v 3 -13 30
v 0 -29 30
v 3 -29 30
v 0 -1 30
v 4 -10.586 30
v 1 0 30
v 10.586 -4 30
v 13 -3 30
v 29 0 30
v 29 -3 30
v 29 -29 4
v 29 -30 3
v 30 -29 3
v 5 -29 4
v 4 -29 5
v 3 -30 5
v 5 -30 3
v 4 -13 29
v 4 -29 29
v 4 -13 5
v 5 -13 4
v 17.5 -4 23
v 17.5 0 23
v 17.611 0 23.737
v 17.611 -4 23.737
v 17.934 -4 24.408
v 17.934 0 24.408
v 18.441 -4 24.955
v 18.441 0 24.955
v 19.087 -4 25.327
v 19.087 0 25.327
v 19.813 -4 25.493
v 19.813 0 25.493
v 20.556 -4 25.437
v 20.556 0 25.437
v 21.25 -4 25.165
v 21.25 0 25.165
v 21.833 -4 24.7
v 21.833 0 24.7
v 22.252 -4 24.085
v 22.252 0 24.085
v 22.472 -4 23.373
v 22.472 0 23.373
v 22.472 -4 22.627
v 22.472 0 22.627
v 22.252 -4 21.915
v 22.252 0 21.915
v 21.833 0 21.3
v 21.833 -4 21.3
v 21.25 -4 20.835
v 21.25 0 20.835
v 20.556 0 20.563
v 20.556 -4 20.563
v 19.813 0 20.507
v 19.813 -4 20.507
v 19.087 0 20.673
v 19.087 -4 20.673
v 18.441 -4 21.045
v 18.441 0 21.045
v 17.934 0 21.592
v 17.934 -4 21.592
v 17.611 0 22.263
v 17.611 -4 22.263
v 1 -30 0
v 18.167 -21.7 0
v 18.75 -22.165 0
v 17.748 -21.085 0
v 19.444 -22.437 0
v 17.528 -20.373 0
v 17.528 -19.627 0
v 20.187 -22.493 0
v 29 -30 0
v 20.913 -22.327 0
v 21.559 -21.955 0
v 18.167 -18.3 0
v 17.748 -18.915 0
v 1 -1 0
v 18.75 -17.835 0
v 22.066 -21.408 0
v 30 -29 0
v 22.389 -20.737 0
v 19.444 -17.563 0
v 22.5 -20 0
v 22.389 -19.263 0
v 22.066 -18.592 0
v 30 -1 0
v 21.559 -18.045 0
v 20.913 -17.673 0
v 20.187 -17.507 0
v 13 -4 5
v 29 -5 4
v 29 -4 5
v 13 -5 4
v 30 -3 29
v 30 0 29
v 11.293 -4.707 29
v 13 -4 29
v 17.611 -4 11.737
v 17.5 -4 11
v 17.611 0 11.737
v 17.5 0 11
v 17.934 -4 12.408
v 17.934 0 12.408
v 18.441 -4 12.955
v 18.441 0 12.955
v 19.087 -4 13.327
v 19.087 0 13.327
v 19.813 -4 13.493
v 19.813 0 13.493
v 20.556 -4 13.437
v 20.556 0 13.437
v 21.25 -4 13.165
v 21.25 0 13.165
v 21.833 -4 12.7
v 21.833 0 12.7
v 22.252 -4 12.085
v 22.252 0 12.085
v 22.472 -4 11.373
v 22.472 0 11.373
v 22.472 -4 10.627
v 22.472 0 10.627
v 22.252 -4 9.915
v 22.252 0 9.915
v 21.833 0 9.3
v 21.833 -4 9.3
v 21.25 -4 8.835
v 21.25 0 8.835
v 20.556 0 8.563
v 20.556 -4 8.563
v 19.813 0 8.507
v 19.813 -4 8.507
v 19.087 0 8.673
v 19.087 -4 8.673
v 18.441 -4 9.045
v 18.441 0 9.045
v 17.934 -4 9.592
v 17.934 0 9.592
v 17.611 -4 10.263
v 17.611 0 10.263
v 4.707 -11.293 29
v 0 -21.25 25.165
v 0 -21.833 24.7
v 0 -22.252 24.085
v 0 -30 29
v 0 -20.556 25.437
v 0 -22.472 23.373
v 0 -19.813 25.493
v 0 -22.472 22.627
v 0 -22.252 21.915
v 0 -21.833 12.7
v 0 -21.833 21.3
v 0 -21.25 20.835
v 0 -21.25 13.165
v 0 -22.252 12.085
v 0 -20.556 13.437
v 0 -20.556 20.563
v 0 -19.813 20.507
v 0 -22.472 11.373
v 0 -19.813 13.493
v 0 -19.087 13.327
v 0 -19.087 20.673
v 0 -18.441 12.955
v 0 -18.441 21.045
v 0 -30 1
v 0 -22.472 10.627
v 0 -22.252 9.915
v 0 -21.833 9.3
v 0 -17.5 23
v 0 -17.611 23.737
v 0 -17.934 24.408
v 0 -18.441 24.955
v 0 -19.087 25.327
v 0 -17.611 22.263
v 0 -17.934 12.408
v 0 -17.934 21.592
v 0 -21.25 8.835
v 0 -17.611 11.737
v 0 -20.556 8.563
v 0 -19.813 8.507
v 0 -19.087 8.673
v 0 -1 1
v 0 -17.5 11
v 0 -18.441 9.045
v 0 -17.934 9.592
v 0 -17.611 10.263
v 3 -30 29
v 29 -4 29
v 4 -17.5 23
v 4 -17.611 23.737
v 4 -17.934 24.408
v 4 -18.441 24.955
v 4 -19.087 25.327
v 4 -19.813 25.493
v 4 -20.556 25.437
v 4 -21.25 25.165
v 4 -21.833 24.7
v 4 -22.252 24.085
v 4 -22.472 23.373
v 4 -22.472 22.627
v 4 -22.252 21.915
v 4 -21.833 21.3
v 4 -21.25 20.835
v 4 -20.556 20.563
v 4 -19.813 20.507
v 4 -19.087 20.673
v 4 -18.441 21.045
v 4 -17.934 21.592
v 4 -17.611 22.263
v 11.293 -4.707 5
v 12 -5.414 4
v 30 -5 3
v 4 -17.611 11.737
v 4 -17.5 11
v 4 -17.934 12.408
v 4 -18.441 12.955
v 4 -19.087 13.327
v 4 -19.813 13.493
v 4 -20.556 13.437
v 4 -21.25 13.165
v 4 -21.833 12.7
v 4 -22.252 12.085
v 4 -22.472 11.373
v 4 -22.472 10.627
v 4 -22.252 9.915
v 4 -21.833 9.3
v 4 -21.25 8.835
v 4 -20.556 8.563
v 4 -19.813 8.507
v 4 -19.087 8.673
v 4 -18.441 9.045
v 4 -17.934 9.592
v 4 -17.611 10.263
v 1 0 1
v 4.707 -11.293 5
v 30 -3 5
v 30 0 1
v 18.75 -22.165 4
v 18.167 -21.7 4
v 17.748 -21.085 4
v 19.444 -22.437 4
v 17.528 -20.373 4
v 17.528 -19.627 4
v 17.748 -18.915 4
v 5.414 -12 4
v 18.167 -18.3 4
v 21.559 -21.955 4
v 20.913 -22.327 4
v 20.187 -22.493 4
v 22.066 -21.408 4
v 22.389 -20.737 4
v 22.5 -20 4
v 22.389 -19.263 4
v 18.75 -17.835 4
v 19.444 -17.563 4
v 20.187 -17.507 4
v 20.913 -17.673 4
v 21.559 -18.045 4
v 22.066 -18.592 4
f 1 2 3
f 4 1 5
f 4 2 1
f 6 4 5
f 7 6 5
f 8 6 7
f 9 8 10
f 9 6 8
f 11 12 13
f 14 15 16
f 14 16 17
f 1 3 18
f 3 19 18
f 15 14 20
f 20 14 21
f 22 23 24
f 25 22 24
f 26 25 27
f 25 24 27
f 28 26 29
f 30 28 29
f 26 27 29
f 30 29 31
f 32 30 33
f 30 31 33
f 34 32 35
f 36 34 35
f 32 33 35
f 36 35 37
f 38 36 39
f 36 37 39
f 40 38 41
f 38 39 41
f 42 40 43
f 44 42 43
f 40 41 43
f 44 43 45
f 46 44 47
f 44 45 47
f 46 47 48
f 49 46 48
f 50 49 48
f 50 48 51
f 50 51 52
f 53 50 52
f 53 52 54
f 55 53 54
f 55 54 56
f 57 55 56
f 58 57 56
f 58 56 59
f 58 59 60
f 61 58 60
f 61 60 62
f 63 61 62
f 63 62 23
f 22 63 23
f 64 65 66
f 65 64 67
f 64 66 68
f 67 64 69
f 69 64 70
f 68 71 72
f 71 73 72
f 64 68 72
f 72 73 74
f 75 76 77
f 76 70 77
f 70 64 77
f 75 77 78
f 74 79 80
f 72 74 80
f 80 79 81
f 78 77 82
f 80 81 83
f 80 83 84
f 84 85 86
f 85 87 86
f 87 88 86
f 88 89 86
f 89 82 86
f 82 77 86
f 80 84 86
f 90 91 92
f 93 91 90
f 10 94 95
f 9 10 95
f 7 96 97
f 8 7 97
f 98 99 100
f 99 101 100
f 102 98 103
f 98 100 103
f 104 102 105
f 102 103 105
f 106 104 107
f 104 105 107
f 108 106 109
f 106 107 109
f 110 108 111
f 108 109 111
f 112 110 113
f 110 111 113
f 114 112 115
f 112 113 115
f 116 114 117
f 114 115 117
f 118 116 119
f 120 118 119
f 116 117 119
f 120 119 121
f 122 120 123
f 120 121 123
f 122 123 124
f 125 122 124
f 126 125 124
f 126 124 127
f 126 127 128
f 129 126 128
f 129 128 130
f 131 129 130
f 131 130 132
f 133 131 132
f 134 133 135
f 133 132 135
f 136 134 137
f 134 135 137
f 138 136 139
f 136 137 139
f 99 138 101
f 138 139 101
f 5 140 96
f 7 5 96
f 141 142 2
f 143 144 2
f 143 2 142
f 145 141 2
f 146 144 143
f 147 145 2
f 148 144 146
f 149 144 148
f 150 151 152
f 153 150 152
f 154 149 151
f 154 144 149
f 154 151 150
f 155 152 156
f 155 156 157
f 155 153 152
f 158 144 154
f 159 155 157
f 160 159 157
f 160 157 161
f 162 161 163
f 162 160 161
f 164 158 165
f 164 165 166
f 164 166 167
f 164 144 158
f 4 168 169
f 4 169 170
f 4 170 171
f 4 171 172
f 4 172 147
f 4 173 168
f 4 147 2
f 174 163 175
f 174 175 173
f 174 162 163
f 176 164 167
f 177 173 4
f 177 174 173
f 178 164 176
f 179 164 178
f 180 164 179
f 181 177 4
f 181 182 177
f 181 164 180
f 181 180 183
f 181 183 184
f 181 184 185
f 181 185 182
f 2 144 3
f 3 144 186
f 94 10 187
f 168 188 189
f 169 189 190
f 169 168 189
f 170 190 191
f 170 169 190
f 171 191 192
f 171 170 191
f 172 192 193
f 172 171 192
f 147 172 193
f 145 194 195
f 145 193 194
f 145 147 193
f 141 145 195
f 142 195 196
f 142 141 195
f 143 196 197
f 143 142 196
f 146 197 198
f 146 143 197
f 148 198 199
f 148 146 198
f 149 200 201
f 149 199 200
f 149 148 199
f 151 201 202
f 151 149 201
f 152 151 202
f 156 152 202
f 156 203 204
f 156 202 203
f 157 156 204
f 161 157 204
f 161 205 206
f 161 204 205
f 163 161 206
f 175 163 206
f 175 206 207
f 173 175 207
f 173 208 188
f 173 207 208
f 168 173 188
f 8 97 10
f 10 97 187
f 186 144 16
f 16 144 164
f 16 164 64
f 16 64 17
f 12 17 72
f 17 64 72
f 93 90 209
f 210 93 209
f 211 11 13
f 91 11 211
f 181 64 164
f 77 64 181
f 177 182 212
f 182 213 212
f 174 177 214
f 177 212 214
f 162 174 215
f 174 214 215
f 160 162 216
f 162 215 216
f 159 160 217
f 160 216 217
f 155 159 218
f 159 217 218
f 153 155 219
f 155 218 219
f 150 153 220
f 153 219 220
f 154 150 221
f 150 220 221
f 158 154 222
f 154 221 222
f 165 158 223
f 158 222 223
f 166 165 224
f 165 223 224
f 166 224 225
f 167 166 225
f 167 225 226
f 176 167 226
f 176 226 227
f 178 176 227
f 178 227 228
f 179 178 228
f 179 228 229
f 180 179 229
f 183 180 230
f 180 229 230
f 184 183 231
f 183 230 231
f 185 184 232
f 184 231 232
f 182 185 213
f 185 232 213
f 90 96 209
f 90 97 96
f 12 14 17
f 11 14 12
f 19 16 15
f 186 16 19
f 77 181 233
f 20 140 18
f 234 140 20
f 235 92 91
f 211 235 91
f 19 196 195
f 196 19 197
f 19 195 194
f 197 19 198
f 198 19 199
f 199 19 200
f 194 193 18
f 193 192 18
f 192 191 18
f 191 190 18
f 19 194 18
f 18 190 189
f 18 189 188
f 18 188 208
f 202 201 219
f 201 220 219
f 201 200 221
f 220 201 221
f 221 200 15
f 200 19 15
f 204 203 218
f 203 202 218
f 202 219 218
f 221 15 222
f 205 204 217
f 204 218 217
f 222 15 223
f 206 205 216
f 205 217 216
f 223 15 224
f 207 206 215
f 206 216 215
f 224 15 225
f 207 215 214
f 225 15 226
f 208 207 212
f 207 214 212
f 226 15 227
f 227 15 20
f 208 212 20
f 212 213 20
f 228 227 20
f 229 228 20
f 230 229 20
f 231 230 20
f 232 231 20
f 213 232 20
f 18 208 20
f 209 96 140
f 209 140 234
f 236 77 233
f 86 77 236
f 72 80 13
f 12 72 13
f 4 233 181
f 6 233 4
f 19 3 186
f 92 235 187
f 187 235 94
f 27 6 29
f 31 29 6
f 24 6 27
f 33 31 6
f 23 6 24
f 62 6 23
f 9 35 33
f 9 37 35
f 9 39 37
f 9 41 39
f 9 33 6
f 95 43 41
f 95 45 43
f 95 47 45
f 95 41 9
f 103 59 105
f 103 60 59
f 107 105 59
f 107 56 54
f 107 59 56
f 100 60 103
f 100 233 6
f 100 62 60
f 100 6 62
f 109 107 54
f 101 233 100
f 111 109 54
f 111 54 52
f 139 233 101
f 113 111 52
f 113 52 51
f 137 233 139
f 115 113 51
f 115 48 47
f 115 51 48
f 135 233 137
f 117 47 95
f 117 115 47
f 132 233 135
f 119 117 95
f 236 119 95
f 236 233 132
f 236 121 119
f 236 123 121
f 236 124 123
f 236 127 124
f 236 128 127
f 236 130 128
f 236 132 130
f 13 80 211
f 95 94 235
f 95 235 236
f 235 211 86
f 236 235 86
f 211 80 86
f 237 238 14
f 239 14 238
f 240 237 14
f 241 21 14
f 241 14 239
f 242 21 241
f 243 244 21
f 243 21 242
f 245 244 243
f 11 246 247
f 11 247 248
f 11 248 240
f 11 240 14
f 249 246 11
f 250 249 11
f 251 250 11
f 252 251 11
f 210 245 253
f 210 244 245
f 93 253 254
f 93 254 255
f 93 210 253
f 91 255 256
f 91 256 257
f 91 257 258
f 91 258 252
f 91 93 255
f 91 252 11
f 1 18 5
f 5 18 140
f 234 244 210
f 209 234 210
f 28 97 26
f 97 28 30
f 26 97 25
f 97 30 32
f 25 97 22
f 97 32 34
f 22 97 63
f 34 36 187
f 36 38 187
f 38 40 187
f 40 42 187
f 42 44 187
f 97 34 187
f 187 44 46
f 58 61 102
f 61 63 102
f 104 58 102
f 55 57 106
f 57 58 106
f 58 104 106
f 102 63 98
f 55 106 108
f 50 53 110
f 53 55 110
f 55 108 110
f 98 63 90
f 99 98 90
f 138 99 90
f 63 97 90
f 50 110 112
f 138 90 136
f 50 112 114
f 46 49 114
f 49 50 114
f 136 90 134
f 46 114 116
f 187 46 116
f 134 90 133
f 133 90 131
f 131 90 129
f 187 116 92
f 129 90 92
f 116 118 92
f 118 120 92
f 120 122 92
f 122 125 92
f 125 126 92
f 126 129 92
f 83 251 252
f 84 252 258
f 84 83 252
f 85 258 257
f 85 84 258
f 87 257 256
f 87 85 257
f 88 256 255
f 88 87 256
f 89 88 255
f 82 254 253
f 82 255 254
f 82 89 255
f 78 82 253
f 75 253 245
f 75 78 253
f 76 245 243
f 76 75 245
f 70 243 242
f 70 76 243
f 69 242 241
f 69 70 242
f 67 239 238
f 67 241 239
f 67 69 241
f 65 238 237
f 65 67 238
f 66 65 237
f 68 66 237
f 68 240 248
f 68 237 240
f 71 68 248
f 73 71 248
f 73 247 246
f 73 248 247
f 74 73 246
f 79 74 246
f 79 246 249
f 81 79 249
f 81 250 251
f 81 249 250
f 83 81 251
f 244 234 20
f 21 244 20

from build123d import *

# Parameters (mm, degrees)
SKETCH_W           = 30
SKETCH_H           = 30
PAD_DEPTH          = 30
THICKNESS_T        = -4
SKETCH001_R        = 2.5
POCKET_DEPTH       = 5
POLARPATTERN_COUNT = 2
POLARPATTERN_ANGLE = 90
CYLINDER_R         = 2.5
CYLINDER_DEPTH     = 10
CHAMFER_SIZE       = 8
CHAMFER001_SIZE    = 1


with BuildPart() as part:
    # Sketch → Pad (new body)
    with BuildSketch(Plane.XY):
        with Locations((15, -15)):
            Rectangle(SKETCH_W, SKETCH_H)
    extrude(amount=PAD_DEPTH)

    # Thickness
    thickness_openings = [part.faces().sort_by_distance(p)[0] for p in [
        (30, -15, 15),
        (15, -30, 15),
        (15, -15, 30),
    ]]
    offset(amount=THICKNESS_T, openings=thickness_openings)

    # Sketch001 → Pocket (cut, symmetric)
    with BuildSketch(Plane(origin=(0, 0, 2), x_dir=(0, 1, 0), z_dir=(1, 0, 0))):
        with Locations((-20, 21)):
            Circle(SKETCH001_R)
        with Locations((-20, 9)):
            Circle(SKETCH001_R)
    pocket = extrude(amount=POCKET_DEPTH, both=True, mode=Mode.SUBTRACT)

    # PolarPattern: Pocket ×2 about axis
    polarpattern_axis = Axis((0, 0, 2), (0, 0, 1))
    for i in range(1, POLARPATTERN_COUNT):
        add(pocket.rotate(polarpattern_axis, i * POLARPATTERN_ANGLE / (POLARPATTERN_COUNT - 1)), mode=Mode.SUBTRACT)

    # Cylinder → Cylinder (cut)
    with BuildSketch(Plane(origin=(20, -20, 0), x_dir=(1, 0, 0), z_dir=(0, 0, 1))):
        Circle(CYLINDER_R)
    extrude(amount=CYLINDER_DEPTH, mode=Mode.SUBTRACT)

    # Chamfer
    chamfer_edges = [part.edges().sort_by_distance(p)[0] for p in [
        (4, -4, 17),
    ]]
    chamfer(chamfer_edges, length=CHAMFER_SIZE)

    # Chamfer001
    chamfer001_edges = [part.edges().sort_by_distance(p)[0] for p in [
        (4, -21, 30),
        (8, -8, 30),
        (2, -30, 30),
        (21, -4, 30),
        (30, -2, 30),
        (4, -21, 4),
        (4, -12, 17),
        (4, -30, 17),
        (8, -8, 4),
        (12, -4, 17),
        (30, -30, 2),
        (17, -30, 4),
        (21, -4, 4),
        (30, -4, 17),
        (0, -15, 0),
        (0, 0, 15),
        (30, -17, 4),
        (15, 0, 0),
        (2, -17.5, 23),
        (2, -17.5, 11),
        (17.5, -2, 23),
        (17.5, -2, 11),
        (22.5, -20, 2),
    ]]
    chamfer(chamfer001_edges, length=CHAMFER001_SIZE)


solid = part.part
